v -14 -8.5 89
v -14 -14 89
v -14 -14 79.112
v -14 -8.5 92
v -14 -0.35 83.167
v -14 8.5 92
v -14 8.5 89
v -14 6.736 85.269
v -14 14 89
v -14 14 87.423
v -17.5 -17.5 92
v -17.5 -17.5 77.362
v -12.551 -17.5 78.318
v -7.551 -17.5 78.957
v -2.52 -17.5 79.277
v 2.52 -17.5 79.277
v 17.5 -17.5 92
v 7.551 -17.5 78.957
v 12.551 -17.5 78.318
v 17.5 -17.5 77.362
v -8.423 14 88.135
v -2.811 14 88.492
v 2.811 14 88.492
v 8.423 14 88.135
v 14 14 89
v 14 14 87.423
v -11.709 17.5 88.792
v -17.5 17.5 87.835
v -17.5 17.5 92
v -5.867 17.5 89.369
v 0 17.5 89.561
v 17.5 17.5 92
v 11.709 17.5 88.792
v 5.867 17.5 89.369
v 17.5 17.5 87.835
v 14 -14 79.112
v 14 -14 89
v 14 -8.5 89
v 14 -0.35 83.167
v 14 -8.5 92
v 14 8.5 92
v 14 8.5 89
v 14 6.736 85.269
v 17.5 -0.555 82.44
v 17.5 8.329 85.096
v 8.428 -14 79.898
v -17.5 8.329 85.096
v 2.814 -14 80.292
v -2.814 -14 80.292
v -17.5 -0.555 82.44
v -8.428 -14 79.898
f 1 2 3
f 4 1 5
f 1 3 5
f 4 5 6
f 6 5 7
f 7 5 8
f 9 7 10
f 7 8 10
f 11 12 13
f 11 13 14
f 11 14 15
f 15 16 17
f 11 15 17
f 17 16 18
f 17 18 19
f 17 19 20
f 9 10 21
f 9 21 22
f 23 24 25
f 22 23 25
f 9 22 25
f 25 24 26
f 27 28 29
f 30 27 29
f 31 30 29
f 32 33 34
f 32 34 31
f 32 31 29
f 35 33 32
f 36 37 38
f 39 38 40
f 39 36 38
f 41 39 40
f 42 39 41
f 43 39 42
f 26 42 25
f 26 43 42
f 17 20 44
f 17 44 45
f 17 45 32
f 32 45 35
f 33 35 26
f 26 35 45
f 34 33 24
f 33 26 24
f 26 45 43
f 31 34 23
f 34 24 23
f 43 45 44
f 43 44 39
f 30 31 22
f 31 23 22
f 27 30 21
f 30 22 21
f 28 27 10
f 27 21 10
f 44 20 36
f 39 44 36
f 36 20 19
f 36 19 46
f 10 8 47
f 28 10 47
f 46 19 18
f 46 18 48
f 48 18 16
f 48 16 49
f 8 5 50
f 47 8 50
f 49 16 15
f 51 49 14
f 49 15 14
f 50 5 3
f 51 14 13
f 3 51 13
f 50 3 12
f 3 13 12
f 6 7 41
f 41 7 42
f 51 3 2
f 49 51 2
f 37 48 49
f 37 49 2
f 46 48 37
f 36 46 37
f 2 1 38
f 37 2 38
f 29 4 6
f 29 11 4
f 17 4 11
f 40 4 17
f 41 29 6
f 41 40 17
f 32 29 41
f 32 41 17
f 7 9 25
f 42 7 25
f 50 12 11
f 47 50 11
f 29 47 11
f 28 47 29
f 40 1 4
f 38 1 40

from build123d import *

# Parameters (mm, degrees)
SKETCH_W        = 35
SKETCH_H        = 35
PAD_DEPTH       = 92
SKETCH002_W     = 28
SKETCH002_H     = 28
POCKET001_DEPTH = 89
SKETCH003_W     = 28
SKETCH003_H     = 17
POCKET_DEPTH    = 92.001


with BuildPart() as kegel:
    # Cone → Cone (revolve)
    with BuildSketch(Plane(origin=(0, 19, 0), x_dir=(1, 0, 0), z_dir=(0, 0, -1))):
        Polygon((0, 0), (90, 0), (78, 41), (0, 41), align=None)
    revolve(axis=Axis((0, 19, 0), (0, -1, 0)))


with BuildPart() as cut:
    # Sketch → Pad (new body)
    with BuildSketch(Plane.XY):
        Rectangle(SKETCH_W, SKETCH_H)
    extrude(amount=PAD_DEPTH)

    # Sketch002 → Pocket001 (cut)
    with BuildSketch(Plane.XY):
        Rectangle(SKETCH002_W, SKETCH002_H)
    extrude(amount=POCKET001_DEPTH, mode=Mode.SUBTRACT)

    # Sketch003 → Pocket (cut, through all)
    with BuildSketch(Plane.XY):
        Rectangle(SKETCH003_W, SKETCH003_H)
    extrude(amount=POCKET_DEPTH, mode=Mode.SUBTRACT)

    # Cut: cut Kegel
    add(kegel.part, mode=Mode.SUBTRACT)


solid = cut.part
